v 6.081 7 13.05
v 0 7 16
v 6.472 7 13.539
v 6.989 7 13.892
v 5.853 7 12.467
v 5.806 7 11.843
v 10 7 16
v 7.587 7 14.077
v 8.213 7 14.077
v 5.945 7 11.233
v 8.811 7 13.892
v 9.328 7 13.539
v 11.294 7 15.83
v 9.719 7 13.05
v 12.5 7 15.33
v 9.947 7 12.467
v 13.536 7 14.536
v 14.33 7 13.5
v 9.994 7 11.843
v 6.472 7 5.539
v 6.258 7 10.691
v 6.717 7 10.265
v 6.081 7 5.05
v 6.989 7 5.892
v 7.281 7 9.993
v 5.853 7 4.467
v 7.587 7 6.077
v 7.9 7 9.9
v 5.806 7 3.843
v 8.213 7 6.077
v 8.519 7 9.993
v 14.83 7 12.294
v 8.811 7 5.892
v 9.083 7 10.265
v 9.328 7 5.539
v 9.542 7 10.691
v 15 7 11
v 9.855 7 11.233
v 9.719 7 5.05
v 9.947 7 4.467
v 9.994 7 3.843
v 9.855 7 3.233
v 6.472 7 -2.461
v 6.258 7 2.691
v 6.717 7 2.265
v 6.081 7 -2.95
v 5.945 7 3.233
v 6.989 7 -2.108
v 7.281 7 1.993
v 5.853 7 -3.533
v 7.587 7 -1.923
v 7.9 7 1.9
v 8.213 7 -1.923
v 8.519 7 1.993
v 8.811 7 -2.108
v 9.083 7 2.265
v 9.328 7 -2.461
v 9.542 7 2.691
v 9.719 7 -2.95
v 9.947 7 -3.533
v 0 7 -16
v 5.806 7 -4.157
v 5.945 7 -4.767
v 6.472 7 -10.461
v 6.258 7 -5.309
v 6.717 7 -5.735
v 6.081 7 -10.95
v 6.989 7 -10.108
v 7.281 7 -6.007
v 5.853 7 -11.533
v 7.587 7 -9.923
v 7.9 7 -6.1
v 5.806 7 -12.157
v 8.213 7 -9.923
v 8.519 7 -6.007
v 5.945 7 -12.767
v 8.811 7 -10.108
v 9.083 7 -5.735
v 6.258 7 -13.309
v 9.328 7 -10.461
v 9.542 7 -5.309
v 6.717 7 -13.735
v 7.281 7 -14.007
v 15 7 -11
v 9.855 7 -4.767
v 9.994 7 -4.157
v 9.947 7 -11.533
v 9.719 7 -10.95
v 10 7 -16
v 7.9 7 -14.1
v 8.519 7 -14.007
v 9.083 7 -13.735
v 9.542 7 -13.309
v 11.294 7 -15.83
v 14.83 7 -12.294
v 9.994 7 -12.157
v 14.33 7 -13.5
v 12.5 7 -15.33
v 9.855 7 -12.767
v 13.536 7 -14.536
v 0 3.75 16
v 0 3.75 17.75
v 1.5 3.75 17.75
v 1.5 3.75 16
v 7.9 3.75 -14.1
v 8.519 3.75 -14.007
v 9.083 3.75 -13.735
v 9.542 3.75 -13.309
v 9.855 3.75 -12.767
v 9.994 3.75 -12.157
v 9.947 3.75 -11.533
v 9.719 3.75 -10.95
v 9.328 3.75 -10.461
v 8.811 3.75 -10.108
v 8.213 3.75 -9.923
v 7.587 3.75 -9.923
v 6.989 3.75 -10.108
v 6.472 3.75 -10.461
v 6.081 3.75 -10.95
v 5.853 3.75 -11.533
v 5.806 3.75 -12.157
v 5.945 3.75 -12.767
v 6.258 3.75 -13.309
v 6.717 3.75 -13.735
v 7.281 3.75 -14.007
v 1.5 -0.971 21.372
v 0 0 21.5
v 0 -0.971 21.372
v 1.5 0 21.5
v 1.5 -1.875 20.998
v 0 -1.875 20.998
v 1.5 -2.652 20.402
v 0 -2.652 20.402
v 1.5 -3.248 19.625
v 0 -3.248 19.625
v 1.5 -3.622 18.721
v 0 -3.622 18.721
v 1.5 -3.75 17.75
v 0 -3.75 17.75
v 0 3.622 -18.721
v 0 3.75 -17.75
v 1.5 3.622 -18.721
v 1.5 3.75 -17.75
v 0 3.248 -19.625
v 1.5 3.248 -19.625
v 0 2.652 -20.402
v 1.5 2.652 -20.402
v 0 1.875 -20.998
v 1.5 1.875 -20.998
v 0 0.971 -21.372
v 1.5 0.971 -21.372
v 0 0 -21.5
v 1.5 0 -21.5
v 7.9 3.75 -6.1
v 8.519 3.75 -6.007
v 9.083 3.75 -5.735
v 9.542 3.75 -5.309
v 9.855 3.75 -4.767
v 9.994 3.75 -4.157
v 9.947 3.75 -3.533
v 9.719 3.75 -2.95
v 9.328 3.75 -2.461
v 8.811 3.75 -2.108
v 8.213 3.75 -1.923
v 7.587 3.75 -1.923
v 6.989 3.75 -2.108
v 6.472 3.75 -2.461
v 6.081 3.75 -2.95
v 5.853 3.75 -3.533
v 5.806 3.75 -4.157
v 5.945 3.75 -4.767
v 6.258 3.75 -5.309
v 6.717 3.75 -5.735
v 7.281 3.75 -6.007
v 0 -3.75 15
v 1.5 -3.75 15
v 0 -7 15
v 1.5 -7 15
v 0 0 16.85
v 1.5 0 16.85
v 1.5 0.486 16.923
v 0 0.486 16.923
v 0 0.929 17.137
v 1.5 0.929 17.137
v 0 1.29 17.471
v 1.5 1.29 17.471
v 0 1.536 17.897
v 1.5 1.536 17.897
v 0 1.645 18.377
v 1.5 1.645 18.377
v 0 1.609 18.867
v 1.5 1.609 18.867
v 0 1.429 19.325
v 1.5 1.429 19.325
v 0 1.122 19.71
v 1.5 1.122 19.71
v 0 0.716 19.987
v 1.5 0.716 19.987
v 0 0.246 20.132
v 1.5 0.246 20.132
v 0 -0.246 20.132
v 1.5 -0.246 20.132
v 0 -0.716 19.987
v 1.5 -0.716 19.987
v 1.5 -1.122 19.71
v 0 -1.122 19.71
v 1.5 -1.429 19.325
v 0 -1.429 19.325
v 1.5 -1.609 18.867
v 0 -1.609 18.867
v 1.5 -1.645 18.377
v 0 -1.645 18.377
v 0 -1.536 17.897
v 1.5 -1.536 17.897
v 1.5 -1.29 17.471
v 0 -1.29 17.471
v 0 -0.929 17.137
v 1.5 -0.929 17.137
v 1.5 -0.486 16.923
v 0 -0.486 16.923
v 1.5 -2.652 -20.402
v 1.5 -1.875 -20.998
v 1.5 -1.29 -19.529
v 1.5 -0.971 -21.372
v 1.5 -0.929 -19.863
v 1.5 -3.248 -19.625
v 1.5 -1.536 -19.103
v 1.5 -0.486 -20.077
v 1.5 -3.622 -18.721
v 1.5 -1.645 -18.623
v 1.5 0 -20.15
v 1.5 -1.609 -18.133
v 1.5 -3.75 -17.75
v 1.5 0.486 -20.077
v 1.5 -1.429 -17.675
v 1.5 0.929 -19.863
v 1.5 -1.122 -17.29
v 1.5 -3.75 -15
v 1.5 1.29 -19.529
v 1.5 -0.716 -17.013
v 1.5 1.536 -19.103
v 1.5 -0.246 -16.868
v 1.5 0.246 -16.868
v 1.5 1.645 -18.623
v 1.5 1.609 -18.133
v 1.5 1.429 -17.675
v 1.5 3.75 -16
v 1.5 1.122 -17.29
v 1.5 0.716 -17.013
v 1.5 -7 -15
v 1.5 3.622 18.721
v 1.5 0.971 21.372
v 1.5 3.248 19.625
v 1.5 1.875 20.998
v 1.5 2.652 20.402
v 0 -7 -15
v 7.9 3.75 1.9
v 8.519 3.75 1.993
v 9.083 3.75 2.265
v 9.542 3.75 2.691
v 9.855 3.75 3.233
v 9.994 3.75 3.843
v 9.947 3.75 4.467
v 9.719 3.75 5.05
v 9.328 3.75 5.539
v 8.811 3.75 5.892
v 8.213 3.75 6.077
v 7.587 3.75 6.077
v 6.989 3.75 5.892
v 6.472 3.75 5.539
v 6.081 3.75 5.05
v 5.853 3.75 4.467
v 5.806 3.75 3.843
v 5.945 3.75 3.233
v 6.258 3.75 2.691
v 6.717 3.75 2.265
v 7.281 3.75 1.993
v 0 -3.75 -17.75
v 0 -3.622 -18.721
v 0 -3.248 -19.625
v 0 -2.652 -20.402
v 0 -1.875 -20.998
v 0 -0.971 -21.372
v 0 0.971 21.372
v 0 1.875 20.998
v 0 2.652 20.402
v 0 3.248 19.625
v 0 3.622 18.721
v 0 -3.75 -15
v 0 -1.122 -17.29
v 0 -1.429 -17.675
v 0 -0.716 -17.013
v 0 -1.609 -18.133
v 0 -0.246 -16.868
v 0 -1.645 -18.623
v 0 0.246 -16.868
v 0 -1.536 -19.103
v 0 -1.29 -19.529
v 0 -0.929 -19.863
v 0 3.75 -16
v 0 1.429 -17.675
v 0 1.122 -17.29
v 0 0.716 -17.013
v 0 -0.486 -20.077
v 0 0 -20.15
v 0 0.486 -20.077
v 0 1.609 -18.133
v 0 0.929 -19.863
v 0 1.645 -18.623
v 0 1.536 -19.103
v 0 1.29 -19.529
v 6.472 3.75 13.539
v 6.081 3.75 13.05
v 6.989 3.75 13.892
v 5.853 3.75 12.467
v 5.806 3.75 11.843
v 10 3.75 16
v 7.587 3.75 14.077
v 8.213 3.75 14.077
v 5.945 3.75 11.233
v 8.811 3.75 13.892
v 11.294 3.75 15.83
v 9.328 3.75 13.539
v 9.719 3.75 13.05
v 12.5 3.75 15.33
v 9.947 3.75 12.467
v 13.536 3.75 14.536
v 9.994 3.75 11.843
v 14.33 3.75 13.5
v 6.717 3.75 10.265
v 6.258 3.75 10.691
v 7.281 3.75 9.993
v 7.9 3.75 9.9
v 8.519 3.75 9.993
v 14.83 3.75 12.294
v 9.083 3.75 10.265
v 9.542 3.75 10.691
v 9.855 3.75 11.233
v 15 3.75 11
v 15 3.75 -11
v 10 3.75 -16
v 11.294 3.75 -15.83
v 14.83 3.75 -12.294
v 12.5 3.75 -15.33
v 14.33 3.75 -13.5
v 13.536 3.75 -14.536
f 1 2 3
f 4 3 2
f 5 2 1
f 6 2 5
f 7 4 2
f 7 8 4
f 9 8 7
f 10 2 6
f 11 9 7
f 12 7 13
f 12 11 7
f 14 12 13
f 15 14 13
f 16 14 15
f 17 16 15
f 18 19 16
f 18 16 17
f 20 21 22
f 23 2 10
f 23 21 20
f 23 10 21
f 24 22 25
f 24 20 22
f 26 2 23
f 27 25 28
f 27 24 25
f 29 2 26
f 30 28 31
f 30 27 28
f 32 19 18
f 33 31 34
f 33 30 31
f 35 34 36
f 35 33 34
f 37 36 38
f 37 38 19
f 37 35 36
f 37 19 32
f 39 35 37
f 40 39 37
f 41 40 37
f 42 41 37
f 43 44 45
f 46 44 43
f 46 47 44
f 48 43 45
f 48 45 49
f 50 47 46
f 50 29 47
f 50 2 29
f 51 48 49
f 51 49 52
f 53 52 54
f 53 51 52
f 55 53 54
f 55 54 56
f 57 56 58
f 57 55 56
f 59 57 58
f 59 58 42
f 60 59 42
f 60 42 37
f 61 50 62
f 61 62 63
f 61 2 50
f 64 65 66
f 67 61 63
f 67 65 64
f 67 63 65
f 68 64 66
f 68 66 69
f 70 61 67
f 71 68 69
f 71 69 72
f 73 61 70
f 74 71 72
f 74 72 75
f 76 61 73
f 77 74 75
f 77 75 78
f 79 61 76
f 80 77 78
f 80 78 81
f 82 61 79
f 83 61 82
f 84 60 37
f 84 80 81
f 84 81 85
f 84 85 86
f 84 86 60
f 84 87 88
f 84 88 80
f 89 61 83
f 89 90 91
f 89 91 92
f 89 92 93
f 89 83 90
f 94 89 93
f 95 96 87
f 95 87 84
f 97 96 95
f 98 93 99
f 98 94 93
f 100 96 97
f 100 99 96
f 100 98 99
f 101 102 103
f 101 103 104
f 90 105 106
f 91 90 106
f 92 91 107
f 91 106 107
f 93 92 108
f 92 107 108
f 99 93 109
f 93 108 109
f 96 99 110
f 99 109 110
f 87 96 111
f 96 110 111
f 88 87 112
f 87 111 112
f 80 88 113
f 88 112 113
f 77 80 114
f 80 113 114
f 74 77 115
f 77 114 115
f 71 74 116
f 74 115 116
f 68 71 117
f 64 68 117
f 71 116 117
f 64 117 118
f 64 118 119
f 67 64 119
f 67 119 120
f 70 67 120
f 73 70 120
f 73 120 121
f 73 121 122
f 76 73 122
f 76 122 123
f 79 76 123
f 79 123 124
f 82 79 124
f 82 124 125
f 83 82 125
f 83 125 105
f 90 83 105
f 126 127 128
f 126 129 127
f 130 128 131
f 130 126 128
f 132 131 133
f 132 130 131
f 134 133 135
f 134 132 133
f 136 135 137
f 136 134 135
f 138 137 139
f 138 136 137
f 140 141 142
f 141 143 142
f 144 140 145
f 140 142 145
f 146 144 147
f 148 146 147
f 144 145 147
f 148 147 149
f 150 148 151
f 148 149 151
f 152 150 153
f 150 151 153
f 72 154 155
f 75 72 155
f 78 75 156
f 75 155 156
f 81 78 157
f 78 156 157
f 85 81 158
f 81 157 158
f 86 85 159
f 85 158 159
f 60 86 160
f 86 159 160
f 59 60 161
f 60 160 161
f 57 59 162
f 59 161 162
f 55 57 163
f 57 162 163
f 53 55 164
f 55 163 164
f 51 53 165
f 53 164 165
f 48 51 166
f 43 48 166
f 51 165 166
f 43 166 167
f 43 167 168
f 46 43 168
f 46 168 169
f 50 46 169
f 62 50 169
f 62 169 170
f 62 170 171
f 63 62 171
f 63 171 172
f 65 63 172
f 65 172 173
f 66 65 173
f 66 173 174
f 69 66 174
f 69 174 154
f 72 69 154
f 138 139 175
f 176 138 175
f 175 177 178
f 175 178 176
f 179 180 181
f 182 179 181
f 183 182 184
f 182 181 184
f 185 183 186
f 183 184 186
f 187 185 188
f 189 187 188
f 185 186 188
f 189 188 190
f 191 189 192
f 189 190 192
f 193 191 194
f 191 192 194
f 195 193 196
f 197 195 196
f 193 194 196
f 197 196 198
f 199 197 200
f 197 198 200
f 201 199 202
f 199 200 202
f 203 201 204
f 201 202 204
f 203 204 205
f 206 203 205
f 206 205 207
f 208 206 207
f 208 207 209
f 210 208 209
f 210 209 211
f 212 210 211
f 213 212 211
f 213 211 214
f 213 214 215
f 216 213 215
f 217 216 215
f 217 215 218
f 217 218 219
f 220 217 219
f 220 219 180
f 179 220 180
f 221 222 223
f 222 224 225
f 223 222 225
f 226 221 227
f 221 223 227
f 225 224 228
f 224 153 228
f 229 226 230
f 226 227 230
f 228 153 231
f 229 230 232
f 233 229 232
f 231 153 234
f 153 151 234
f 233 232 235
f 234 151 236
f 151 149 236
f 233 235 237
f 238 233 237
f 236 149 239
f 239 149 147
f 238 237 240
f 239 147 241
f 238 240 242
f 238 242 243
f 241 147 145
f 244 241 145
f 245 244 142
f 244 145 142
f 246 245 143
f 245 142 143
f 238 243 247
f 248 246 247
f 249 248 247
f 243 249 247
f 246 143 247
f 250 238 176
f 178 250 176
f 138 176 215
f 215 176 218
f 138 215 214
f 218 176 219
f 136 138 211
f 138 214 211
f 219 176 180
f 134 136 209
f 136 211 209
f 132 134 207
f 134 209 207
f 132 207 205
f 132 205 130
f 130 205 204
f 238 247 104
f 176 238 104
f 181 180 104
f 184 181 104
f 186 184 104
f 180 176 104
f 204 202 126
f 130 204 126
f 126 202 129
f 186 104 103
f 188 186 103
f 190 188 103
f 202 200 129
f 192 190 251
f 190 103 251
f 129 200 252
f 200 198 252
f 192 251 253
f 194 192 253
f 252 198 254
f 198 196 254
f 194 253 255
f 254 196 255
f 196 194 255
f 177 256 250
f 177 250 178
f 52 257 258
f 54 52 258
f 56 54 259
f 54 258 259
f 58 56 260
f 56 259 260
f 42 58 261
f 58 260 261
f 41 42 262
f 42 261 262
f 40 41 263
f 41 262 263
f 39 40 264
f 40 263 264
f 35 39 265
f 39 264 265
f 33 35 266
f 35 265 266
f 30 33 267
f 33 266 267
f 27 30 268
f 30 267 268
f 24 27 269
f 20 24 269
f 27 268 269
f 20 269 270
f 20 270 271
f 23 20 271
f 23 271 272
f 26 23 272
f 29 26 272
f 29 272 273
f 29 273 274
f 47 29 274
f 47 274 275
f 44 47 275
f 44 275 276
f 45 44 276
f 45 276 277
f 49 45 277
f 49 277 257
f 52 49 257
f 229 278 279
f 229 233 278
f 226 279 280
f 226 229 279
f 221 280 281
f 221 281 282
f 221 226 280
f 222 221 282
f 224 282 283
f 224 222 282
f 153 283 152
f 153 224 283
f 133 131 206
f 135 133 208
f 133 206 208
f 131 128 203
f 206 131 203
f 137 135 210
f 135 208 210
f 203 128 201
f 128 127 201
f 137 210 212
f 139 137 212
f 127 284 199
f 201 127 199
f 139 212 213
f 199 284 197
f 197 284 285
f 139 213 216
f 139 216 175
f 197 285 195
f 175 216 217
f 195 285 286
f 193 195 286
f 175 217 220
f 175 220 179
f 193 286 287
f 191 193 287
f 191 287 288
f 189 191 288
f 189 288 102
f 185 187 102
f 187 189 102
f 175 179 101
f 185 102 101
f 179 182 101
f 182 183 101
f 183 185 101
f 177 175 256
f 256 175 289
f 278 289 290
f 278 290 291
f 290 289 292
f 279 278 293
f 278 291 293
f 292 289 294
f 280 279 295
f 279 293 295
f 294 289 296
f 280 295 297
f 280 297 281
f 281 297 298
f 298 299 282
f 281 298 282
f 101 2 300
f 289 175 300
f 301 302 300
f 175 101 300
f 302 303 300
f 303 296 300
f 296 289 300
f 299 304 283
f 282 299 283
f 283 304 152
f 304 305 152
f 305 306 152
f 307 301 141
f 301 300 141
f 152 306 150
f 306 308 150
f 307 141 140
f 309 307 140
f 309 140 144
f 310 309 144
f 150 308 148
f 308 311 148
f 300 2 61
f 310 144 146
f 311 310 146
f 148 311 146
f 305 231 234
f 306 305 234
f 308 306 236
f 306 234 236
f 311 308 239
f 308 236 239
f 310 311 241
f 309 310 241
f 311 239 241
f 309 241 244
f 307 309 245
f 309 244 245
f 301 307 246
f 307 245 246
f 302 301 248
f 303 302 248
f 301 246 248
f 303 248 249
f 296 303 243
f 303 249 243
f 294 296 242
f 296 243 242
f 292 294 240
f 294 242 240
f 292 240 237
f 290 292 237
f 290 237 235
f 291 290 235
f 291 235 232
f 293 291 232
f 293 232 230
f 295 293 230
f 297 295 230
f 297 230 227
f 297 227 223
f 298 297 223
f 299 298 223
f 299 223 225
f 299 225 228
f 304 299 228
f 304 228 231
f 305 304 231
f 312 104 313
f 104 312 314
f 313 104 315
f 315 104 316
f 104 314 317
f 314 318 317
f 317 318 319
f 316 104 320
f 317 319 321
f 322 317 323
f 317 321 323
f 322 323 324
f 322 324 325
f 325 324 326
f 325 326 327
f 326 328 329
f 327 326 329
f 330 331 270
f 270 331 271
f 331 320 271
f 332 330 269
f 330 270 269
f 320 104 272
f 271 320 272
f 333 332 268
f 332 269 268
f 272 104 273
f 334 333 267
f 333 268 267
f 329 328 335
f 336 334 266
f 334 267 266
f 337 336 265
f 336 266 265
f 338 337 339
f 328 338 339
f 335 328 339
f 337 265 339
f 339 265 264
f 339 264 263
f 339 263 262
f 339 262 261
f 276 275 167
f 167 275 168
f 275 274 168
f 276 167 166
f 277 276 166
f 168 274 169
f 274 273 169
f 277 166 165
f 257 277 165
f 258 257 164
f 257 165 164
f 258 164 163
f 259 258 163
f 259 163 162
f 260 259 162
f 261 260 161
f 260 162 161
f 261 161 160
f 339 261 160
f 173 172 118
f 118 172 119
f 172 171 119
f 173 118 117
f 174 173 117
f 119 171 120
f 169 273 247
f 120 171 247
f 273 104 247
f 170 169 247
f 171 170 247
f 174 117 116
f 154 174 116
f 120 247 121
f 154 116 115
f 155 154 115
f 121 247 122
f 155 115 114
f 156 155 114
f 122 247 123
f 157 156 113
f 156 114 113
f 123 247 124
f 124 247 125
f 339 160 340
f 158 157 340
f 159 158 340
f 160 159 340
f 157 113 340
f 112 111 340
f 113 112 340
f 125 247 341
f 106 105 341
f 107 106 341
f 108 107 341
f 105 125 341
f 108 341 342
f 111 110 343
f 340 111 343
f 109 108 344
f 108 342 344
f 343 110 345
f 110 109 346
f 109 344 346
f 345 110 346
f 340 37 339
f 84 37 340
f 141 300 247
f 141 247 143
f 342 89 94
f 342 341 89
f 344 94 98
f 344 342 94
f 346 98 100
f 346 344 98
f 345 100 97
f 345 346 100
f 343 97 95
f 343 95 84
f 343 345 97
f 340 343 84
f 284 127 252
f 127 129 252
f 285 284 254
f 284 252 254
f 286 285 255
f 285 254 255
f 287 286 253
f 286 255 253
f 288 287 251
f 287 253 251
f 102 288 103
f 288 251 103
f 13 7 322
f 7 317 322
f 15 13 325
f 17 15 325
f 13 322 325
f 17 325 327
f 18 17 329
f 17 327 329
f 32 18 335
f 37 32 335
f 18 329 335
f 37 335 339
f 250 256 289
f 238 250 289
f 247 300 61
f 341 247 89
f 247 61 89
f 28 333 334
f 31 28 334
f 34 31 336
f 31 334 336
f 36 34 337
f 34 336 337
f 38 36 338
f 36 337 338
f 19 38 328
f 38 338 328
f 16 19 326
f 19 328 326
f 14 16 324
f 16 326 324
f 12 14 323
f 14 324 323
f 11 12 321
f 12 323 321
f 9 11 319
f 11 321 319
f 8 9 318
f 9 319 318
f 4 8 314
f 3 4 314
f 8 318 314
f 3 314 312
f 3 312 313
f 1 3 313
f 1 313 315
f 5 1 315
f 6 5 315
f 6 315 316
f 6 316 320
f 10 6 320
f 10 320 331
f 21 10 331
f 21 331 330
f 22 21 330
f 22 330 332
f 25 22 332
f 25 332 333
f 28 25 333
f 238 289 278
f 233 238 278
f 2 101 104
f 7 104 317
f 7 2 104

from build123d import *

# Parameters (mm, degrees)
SKETCH_1_W          = 43
SKETCH_1_H          = 7.5
EXTRUDE_1_DEPTH     = 1.5
SKETCH_2_R          = 1.65
CUT_EXTRUDE_2_DEPTH = 11.5
FILLET_1_R          = 3.75
SKETCH_3_W          = 30
SKETCH_3_H          = 14
EXTRUDE_3_DEPTH     = 1.5
SKETCH_4_W          = 15
SKETCH_4_H          = 32
EXTRUDE_4_DEPTH     = 3.25
SKETCH_5_R          = 2.1
CUT_EXTRUDE_3_DEPTH = 13
FILLET_3_R          = 5


with BuildPart() as part:
    # 草圖1 → 填料-伸長1 (new body)
    with BuildSketch(Plane(origin=(0, 0, 0), x_dir=(0, 0, -1), z_dir=(1, 0, 0))):
        Rectangle(SKETCH_1_W, SKETCH_1_H)
    extrude(amount=EXTRUDE_1_DEPTH)

    # 草圖2 → 除料-伸長2 (cut)
    with BuildSketch(Plane(origin=(1.5, 0, 0), x_dir=(0, 0, -1), z_dir=(1, 0, 0))):
        with Locations((-18.5, 0)):
            Circle(SKETCH_2_R)
        with Locations((18.5, 0)):
            Circle(SKETCH_2_R)
    extrude(amount=-CUT_EXTRUDE_2_DEPTH, mode=Mode.SUBTRACT)

    # 圓角1
    fillet_1_edges = [part.edges().sort_by_distance(p)[0] for p in [
        (0.75, -3.75, -21.5),
        (0.75, 3.75, -21.5),
        (0.75, -3.75, 21.5),
        (0.75, 3.75, 21.5),
    ]]
    fillet(fillet_1_edges, radius=FILLET_1_R - 0.0001)  # a hair under: the kernel refuses the full size

    # 草圖3 → 填料-伸長3 (add)
    with BuildSketch(Plane.ZY):
        Rectangle(SKETCH_3_W, SKETCH_3_H)
    extrude(amount=-EXTRUDE_3_DEPTH)

    # 草圖4 → 填料-伸長4 (add)
    with BuildSketch(Plane(origin=(0, 7, 0), x_dir=(1, 0, 0), z_dir=(0, 1, 0))):
        with Locations((7.5, 0)):
            Rectangle(SKETCH_4_W, SKETCH_4_H)
    extrude(amount=-EXTRUDE_4_DEPTH)

    # 草圖5 → 除料-伸長3 (cut)
    with BuildSketch(Plane.XZ.offset(-3.75)):
        with Locations(Location((7.9, 12, 0), (0, 0, 270))):
            Circle(SKETCH_5_R)
        with Locations(Location((7.9, 4, 0), (0, 0, 270))):
            Circle(SKETCH_5_R)
        with Locations(Location((7.9, -4, 0), (0, 0, 270))):
            Circle(SKETCH_5_R)
        with Locations(Location((7.9, -12, 0), (0, 0, 270))):
            Circle(SKETCH_5_R)
    extrude(amount=-CUT_EXTRUDE_3_DEPTH, mode=Mode.SUBTRACT)

    # 圓角3
    fillet_3_edges = [part.edges().sort_by_distance(p)[0] for p in [
        (15, 5.375, -16),
        (15, 5.375, 16),
    ]]
    fillet(fillet_3_edges, radius=FILLET_3_R)


solid = part.part
